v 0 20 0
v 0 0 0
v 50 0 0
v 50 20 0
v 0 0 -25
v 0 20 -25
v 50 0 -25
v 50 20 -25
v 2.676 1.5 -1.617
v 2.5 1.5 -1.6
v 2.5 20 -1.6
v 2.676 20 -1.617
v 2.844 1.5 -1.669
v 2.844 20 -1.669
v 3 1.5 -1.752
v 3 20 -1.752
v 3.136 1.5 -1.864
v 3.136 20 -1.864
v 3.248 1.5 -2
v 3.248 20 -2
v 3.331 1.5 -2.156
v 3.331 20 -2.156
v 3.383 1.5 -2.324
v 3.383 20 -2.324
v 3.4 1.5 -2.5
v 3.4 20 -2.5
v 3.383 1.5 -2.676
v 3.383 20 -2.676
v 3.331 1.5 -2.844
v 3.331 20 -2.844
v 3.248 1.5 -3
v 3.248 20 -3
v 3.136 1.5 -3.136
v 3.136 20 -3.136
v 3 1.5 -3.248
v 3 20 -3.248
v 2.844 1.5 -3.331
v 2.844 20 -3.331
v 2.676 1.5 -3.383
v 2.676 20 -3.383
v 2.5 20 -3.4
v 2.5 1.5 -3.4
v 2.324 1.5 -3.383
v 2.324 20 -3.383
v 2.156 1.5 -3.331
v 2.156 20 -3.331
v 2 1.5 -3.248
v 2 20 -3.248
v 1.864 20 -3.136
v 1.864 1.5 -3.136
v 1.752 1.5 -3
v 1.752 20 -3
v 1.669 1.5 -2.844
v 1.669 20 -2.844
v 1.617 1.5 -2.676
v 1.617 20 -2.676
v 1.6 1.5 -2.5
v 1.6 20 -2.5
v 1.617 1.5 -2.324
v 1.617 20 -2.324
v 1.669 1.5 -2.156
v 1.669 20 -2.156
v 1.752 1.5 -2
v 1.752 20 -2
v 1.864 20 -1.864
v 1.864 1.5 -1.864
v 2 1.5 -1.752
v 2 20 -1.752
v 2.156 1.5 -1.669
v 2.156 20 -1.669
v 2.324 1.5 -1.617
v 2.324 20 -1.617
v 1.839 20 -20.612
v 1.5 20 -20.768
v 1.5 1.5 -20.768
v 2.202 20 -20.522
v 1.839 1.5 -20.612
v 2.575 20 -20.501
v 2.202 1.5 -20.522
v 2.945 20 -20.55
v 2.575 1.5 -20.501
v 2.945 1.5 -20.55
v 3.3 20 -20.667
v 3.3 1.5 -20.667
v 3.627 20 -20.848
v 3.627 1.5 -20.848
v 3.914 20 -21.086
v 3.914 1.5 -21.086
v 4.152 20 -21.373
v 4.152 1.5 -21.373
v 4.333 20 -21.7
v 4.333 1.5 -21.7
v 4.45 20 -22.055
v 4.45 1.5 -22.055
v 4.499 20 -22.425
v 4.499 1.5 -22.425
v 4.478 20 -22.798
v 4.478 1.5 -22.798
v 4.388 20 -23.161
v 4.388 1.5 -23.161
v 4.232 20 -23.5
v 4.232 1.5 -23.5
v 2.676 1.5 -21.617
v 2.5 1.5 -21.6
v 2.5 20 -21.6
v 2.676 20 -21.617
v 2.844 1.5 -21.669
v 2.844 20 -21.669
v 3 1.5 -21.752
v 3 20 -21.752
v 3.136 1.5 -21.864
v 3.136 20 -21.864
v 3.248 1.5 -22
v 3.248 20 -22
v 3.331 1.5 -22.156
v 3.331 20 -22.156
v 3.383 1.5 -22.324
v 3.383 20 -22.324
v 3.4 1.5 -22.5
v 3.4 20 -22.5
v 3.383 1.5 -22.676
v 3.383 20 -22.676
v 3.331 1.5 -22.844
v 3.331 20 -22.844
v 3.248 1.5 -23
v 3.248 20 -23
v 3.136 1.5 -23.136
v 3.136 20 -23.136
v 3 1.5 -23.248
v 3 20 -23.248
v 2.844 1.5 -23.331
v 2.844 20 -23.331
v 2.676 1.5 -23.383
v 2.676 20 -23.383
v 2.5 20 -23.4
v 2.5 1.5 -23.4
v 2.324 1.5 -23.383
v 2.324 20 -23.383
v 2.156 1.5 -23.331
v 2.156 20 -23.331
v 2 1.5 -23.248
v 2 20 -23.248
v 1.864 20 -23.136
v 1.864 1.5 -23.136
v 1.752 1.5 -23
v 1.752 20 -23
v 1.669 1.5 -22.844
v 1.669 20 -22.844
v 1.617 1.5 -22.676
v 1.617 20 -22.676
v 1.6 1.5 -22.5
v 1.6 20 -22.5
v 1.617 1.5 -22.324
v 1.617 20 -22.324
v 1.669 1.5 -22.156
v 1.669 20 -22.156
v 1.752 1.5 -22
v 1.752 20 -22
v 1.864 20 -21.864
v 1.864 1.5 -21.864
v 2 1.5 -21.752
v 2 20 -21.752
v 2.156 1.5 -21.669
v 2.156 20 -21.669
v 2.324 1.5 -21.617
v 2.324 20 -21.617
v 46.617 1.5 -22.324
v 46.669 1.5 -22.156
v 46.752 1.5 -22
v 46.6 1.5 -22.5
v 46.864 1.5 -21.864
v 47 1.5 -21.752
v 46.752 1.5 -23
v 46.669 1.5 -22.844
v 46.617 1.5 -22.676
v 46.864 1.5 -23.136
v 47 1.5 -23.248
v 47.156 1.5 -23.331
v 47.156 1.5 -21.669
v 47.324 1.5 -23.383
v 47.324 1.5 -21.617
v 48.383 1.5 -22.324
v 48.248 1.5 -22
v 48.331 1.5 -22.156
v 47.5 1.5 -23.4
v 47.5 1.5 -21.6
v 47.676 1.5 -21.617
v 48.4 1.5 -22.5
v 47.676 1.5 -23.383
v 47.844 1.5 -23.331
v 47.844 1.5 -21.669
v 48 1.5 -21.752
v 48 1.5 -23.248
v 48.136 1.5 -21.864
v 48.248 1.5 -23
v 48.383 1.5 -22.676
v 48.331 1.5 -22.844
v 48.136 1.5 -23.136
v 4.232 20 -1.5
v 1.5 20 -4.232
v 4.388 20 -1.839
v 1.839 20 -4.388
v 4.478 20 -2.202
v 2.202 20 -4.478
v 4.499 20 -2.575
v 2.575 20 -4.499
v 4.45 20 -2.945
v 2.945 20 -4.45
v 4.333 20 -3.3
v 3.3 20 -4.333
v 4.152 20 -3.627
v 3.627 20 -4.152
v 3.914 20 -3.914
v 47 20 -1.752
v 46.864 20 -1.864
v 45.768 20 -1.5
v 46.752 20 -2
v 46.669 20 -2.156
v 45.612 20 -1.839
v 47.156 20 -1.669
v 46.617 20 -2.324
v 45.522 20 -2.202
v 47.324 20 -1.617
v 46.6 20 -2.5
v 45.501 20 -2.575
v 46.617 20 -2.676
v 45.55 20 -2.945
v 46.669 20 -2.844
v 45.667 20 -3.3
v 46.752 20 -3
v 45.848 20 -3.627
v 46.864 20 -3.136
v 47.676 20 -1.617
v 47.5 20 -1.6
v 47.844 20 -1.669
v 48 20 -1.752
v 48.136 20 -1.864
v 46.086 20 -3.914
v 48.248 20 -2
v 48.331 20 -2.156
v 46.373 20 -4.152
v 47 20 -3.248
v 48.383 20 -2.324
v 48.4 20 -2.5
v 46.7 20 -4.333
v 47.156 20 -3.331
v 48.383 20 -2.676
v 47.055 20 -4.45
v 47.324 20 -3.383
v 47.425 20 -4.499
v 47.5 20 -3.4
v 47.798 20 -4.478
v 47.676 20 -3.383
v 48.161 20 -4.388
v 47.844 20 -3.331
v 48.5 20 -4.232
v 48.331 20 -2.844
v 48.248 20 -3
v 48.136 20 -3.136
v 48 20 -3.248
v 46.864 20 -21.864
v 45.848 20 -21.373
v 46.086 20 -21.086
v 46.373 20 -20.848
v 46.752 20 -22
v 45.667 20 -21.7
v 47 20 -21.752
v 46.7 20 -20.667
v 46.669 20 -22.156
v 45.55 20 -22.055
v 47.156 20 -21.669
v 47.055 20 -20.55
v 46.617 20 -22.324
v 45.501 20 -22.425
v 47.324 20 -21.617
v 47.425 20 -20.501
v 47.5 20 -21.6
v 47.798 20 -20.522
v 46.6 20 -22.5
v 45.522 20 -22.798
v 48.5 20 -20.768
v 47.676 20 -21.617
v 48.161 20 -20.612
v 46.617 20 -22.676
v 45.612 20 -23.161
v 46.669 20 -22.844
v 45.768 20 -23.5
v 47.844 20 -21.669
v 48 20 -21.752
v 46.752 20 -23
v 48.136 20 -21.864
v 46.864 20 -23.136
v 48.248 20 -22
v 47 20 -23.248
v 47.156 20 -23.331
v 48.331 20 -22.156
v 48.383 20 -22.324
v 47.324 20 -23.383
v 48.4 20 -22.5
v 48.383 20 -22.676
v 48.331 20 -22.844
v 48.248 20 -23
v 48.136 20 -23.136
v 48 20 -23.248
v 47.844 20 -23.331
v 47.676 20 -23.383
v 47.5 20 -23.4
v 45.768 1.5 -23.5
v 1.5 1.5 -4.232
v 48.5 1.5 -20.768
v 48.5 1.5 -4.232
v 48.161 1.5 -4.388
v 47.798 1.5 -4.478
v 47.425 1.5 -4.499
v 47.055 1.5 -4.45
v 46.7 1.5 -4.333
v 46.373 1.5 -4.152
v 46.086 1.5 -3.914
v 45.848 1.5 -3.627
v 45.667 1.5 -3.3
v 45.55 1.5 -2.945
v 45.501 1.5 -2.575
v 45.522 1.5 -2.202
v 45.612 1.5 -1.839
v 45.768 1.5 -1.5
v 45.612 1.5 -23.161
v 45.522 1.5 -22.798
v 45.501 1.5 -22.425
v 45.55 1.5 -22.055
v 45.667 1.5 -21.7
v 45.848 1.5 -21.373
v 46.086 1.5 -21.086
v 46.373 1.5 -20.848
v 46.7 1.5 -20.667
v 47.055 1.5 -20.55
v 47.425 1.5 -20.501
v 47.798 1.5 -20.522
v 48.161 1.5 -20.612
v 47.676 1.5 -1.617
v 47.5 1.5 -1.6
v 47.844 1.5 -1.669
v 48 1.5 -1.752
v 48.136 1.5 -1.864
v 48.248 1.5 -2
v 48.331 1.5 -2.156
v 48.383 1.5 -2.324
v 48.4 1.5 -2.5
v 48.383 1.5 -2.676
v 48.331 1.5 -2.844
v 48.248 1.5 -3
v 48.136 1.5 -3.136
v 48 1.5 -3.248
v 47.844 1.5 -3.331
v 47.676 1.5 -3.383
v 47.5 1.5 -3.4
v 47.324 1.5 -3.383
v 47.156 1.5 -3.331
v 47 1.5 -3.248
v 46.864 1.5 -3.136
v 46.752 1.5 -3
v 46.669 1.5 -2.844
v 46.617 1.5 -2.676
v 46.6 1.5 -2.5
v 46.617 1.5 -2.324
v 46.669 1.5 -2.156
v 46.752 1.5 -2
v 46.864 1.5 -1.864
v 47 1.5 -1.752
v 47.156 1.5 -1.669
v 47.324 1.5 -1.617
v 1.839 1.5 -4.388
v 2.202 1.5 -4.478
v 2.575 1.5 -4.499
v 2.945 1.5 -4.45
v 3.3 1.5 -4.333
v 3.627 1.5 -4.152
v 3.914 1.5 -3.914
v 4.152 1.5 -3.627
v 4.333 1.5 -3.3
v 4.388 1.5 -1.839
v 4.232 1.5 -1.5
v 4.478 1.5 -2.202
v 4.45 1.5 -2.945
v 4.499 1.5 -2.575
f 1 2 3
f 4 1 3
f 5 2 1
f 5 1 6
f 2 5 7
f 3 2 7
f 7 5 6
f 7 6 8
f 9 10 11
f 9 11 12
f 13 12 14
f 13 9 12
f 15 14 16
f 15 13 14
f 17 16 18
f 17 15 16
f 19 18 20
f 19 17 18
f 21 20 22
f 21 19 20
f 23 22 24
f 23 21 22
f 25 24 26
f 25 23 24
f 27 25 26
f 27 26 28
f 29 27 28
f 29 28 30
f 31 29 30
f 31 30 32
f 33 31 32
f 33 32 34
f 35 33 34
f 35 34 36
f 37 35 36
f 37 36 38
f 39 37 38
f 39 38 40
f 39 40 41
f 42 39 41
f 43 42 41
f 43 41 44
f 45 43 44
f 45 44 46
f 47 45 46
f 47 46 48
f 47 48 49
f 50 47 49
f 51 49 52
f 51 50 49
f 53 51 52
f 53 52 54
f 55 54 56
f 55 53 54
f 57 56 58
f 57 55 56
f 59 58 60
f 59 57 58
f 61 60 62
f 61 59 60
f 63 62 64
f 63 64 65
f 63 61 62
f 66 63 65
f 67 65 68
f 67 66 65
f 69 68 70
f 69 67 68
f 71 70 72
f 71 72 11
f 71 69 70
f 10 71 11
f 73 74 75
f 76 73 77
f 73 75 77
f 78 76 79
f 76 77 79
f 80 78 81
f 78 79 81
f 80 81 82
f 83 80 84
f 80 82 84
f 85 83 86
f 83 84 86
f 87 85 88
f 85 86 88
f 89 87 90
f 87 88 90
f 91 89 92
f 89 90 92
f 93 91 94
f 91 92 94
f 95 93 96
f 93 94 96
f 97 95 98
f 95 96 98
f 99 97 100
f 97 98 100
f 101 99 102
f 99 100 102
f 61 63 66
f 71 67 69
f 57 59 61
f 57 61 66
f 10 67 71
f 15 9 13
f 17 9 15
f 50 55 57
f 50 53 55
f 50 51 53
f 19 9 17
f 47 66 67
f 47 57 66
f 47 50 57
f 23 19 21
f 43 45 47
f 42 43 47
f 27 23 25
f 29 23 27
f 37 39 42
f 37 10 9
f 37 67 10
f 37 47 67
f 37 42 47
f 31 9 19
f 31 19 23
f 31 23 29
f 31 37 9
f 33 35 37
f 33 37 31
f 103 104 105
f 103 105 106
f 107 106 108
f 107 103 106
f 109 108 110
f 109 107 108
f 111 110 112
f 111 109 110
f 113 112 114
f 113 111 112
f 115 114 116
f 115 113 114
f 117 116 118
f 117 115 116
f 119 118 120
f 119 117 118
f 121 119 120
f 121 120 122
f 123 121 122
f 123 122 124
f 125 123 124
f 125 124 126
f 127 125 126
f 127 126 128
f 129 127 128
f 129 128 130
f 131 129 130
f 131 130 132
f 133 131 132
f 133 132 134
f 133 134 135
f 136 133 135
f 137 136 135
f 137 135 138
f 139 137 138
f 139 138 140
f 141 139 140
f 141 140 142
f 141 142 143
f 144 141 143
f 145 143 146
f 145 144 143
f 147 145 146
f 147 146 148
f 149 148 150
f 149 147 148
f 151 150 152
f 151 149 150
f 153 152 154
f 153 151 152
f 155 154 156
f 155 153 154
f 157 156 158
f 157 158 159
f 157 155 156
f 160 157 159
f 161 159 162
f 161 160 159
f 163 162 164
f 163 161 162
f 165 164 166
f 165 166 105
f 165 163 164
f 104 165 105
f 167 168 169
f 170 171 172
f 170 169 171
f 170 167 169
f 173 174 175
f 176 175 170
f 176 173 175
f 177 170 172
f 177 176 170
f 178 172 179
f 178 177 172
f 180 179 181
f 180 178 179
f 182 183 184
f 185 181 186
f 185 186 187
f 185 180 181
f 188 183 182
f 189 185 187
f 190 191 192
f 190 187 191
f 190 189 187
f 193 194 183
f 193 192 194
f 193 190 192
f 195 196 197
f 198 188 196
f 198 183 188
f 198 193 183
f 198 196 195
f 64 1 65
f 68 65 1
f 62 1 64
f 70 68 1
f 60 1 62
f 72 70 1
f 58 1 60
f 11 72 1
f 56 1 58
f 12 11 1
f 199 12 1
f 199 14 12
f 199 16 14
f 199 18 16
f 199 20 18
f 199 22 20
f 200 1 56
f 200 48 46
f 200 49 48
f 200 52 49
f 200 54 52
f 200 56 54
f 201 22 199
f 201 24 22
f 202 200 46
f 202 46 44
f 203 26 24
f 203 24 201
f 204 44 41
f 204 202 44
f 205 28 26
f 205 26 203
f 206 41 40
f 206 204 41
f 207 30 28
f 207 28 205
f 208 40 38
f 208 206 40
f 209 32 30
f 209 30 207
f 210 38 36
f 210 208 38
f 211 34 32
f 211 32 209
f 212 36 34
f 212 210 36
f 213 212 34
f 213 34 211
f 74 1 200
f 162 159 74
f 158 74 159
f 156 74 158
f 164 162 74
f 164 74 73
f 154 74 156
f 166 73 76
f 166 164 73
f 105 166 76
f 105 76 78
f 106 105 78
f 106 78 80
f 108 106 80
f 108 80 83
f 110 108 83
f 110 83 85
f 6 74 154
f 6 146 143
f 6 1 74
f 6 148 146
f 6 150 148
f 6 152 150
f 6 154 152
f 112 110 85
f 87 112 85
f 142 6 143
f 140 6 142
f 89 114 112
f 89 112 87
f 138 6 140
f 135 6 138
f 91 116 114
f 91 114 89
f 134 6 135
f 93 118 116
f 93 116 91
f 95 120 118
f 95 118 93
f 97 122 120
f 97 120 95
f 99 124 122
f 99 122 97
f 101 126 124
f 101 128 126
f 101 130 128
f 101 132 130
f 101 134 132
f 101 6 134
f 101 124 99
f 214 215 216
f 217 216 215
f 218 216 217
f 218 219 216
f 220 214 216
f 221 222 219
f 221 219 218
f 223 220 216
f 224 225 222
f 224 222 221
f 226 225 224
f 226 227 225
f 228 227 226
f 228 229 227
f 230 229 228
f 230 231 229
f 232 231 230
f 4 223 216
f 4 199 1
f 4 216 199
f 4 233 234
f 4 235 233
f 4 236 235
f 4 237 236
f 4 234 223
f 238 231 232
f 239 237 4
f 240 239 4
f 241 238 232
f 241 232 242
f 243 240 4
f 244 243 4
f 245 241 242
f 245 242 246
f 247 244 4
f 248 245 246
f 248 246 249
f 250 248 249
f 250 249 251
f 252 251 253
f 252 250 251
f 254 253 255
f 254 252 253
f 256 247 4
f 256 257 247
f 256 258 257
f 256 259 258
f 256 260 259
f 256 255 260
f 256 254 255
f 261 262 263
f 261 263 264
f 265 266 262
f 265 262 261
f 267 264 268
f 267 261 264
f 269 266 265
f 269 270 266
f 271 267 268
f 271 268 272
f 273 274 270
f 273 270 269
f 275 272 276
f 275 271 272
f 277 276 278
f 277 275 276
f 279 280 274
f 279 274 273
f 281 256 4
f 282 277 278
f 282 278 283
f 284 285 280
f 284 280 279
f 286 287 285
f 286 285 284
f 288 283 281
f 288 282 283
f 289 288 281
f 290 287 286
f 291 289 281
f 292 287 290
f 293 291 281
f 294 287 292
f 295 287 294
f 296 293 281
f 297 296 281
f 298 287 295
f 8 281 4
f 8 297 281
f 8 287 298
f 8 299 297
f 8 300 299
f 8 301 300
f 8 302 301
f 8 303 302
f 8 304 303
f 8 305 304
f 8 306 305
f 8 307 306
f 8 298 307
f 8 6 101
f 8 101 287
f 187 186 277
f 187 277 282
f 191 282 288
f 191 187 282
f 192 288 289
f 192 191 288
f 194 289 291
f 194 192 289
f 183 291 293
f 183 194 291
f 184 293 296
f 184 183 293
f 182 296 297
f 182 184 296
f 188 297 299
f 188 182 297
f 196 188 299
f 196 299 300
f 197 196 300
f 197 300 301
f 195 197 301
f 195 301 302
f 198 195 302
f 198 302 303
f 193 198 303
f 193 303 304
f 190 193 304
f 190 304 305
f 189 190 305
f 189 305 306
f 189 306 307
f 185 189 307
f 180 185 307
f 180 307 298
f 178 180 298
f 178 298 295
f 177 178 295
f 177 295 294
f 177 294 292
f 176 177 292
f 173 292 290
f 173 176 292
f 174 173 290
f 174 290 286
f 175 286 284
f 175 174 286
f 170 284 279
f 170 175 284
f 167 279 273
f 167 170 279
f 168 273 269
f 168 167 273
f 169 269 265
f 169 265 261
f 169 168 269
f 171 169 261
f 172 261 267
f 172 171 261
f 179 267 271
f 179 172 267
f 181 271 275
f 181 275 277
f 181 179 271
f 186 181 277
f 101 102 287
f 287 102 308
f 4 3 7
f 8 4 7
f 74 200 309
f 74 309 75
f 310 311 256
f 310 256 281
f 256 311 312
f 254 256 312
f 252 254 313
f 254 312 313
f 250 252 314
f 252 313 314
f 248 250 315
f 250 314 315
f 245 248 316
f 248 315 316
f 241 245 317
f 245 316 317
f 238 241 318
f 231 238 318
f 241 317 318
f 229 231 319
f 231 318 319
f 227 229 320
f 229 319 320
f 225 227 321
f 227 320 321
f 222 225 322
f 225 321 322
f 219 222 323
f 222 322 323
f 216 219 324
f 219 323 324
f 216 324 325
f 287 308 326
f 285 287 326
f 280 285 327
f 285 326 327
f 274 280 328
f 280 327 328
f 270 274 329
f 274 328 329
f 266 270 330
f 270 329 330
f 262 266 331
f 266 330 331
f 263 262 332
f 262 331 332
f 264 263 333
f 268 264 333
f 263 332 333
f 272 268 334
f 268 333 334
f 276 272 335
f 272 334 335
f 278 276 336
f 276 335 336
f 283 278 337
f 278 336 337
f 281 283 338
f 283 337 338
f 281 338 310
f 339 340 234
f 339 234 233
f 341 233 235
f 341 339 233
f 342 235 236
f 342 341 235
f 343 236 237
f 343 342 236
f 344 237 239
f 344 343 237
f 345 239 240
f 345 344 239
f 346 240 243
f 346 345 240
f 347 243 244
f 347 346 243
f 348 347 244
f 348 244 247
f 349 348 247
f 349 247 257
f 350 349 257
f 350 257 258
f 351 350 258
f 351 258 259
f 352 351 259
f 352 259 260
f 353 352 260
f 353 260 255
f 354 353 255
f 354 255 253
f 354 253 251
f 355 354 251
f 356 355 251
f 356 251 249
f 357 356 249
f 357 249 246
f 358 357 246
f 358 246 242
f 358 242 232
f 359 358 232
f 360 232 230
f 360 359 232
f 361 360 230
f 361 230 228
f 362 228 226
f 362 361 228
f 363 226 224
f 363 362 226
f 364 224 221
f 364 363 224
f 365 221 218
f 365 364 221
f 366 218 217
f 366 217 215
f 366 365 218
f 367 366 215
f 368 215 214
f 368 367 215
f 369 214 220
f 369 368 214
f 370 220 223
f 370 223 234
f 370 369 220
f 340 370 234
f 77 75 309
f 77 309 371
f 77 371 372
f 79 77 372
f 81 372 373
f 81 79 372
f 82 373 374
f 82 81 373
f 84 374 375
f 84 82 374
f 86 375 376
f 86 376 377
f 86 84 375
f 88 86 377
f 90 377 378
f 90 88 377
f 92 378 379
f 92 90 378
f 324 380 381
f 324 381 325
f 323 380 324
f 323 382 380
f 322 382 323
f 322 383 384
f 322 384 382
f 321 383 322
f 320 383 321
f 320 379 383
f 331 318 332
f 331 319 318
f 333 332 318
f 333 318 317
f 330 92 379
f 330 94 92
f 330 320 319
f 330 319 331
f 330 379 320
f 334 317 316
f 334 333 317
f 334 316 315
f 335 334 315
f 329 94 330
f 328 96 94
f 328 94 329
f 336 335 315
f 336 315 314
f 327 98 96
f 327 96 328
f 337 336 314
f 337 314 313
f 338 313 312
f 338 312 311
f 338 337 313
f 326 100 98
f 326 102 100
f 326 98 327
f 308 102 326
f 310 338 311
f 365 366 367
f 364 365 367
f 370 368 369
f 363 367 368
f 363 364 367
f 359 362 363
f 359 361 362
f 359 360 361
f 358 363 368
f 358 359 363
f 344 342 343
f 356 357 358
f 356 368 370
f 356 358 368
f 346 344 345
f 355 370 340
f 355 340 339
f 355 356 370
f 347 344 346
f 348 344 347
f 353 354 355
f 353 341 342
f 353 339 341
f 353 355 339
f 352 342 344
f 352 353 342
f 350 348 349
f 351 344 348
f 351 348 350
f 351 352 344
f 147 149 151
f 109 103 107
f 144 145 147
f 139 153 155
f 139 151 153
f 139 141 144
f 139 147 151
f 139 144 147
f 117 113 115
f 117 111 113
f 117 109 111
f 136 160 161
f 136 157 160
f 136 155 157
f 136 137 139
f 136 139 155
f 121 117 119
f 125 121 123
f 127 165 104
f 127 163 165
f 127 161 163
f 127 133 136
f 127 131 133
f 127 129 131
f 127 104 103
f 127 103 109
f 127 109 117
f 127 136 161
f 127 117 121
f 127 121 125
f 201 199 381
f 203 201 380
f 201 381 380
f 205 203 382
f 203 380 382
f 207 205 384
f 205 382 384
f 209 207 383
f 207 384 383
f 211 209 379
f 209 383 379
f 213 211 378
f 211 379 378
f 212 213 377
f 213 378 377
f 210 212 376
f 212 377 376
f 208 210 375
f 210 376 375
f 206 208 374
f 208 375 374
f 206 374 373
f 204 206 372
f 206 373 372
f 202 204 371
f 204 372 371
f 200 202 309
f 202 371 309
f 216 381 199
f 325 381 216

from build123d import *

# Parameters (mm, degrees)
SKETCH_1_W      = 50
SKETCH_1_H      = 25
EXTRUDE_1_DEPTH = 20
SHELL_1_T       = -1.5
SKETCH_1_3_R    = 2
SKETCH_1_3_R_2  = 0.9
EXTRUDE_2_DEPTH = 20


with BuildPart() as part:
    # 草图1 → 凸台-拉伸1 (new body)
    with BuildSketch(Plane(origin=(0, 0, 0), x_dir=(1, 0, 0), z_dir=(0, 1, 0))):
        with Locations((25, 12.5)):
            Rectangle(SKETCH_1_W, SKETCH_1_H)
    extrude(amount=EXTRUDE_1_DEPTH)

    # 抽壳1
    shell_1_openings = [part.faces().sort_by_distance(p)[0] for p in [
        (25, 20, -12.5),
    ]]
    offset(amount=SHELL_1_T, openings=shell_1_openings, kind=Kind.INTERSECTION)

    # 草图1<3> → 凸台-拉伸2 (add)
    # profile 1 of 4: a face of its own
    with BuildSketch(Plane(origin=(0, 0, 0), x_dir=(1, 0, 0), z_dir=(0, 1, 0))):
        with Locations((2.5, 22.5)):
            Circle(SKETCH_1_3_R)
        with Locations((2.5, 22.5)):
            Circle(SKETCH_1_3_R_2, mode=Mode.SUBTRACT)
    # profile 2 of 4: a face of its own
    with BuildSketch(Plane(origin=(0, 0, 0), x_dir=(1, 0, 0), z_dir=(0, 1, 0))):
        with Locations((47.5, 22.5)):
            Circle(SKETCH_1_3_R)
        with Locations((47.5, 22.5)):
            Circle(SKETCH_1_3_R_2, mode=Mode.SUBTRACT)
    # profile 3 of 4: a face of its own
    with BuildSketch(Plane(origin=(0, 0, 0), x_dir=(1, 0, 0), z_dir=(0, 1, 0))):
        with Locations((47.5, 2.5)):
            Circle(SKETCH_1_3_R)
        with Locations((47.5, 2.5)):
            Circle(SKETCH_1_3_R_2, mode=Mode.SUBTRACT)
    # profile 4 of 4: a face of its own
    with BuildSketch(Plane(origin=(0, 0, 0), x_dir=(1, 0, 0), z_dir=(0, 1, 0))):
        with Locations((2.5, 2.5)):
            Circle(SKETCH_1_3_R)
        with Locations((2.5, 2.5)):
            Circle(SKETCH_1_3_R_2, mode=Mode.SUBTRACT)
    extrude(amount=EXTRUDE_2_DEPTH)


solid = part.part
